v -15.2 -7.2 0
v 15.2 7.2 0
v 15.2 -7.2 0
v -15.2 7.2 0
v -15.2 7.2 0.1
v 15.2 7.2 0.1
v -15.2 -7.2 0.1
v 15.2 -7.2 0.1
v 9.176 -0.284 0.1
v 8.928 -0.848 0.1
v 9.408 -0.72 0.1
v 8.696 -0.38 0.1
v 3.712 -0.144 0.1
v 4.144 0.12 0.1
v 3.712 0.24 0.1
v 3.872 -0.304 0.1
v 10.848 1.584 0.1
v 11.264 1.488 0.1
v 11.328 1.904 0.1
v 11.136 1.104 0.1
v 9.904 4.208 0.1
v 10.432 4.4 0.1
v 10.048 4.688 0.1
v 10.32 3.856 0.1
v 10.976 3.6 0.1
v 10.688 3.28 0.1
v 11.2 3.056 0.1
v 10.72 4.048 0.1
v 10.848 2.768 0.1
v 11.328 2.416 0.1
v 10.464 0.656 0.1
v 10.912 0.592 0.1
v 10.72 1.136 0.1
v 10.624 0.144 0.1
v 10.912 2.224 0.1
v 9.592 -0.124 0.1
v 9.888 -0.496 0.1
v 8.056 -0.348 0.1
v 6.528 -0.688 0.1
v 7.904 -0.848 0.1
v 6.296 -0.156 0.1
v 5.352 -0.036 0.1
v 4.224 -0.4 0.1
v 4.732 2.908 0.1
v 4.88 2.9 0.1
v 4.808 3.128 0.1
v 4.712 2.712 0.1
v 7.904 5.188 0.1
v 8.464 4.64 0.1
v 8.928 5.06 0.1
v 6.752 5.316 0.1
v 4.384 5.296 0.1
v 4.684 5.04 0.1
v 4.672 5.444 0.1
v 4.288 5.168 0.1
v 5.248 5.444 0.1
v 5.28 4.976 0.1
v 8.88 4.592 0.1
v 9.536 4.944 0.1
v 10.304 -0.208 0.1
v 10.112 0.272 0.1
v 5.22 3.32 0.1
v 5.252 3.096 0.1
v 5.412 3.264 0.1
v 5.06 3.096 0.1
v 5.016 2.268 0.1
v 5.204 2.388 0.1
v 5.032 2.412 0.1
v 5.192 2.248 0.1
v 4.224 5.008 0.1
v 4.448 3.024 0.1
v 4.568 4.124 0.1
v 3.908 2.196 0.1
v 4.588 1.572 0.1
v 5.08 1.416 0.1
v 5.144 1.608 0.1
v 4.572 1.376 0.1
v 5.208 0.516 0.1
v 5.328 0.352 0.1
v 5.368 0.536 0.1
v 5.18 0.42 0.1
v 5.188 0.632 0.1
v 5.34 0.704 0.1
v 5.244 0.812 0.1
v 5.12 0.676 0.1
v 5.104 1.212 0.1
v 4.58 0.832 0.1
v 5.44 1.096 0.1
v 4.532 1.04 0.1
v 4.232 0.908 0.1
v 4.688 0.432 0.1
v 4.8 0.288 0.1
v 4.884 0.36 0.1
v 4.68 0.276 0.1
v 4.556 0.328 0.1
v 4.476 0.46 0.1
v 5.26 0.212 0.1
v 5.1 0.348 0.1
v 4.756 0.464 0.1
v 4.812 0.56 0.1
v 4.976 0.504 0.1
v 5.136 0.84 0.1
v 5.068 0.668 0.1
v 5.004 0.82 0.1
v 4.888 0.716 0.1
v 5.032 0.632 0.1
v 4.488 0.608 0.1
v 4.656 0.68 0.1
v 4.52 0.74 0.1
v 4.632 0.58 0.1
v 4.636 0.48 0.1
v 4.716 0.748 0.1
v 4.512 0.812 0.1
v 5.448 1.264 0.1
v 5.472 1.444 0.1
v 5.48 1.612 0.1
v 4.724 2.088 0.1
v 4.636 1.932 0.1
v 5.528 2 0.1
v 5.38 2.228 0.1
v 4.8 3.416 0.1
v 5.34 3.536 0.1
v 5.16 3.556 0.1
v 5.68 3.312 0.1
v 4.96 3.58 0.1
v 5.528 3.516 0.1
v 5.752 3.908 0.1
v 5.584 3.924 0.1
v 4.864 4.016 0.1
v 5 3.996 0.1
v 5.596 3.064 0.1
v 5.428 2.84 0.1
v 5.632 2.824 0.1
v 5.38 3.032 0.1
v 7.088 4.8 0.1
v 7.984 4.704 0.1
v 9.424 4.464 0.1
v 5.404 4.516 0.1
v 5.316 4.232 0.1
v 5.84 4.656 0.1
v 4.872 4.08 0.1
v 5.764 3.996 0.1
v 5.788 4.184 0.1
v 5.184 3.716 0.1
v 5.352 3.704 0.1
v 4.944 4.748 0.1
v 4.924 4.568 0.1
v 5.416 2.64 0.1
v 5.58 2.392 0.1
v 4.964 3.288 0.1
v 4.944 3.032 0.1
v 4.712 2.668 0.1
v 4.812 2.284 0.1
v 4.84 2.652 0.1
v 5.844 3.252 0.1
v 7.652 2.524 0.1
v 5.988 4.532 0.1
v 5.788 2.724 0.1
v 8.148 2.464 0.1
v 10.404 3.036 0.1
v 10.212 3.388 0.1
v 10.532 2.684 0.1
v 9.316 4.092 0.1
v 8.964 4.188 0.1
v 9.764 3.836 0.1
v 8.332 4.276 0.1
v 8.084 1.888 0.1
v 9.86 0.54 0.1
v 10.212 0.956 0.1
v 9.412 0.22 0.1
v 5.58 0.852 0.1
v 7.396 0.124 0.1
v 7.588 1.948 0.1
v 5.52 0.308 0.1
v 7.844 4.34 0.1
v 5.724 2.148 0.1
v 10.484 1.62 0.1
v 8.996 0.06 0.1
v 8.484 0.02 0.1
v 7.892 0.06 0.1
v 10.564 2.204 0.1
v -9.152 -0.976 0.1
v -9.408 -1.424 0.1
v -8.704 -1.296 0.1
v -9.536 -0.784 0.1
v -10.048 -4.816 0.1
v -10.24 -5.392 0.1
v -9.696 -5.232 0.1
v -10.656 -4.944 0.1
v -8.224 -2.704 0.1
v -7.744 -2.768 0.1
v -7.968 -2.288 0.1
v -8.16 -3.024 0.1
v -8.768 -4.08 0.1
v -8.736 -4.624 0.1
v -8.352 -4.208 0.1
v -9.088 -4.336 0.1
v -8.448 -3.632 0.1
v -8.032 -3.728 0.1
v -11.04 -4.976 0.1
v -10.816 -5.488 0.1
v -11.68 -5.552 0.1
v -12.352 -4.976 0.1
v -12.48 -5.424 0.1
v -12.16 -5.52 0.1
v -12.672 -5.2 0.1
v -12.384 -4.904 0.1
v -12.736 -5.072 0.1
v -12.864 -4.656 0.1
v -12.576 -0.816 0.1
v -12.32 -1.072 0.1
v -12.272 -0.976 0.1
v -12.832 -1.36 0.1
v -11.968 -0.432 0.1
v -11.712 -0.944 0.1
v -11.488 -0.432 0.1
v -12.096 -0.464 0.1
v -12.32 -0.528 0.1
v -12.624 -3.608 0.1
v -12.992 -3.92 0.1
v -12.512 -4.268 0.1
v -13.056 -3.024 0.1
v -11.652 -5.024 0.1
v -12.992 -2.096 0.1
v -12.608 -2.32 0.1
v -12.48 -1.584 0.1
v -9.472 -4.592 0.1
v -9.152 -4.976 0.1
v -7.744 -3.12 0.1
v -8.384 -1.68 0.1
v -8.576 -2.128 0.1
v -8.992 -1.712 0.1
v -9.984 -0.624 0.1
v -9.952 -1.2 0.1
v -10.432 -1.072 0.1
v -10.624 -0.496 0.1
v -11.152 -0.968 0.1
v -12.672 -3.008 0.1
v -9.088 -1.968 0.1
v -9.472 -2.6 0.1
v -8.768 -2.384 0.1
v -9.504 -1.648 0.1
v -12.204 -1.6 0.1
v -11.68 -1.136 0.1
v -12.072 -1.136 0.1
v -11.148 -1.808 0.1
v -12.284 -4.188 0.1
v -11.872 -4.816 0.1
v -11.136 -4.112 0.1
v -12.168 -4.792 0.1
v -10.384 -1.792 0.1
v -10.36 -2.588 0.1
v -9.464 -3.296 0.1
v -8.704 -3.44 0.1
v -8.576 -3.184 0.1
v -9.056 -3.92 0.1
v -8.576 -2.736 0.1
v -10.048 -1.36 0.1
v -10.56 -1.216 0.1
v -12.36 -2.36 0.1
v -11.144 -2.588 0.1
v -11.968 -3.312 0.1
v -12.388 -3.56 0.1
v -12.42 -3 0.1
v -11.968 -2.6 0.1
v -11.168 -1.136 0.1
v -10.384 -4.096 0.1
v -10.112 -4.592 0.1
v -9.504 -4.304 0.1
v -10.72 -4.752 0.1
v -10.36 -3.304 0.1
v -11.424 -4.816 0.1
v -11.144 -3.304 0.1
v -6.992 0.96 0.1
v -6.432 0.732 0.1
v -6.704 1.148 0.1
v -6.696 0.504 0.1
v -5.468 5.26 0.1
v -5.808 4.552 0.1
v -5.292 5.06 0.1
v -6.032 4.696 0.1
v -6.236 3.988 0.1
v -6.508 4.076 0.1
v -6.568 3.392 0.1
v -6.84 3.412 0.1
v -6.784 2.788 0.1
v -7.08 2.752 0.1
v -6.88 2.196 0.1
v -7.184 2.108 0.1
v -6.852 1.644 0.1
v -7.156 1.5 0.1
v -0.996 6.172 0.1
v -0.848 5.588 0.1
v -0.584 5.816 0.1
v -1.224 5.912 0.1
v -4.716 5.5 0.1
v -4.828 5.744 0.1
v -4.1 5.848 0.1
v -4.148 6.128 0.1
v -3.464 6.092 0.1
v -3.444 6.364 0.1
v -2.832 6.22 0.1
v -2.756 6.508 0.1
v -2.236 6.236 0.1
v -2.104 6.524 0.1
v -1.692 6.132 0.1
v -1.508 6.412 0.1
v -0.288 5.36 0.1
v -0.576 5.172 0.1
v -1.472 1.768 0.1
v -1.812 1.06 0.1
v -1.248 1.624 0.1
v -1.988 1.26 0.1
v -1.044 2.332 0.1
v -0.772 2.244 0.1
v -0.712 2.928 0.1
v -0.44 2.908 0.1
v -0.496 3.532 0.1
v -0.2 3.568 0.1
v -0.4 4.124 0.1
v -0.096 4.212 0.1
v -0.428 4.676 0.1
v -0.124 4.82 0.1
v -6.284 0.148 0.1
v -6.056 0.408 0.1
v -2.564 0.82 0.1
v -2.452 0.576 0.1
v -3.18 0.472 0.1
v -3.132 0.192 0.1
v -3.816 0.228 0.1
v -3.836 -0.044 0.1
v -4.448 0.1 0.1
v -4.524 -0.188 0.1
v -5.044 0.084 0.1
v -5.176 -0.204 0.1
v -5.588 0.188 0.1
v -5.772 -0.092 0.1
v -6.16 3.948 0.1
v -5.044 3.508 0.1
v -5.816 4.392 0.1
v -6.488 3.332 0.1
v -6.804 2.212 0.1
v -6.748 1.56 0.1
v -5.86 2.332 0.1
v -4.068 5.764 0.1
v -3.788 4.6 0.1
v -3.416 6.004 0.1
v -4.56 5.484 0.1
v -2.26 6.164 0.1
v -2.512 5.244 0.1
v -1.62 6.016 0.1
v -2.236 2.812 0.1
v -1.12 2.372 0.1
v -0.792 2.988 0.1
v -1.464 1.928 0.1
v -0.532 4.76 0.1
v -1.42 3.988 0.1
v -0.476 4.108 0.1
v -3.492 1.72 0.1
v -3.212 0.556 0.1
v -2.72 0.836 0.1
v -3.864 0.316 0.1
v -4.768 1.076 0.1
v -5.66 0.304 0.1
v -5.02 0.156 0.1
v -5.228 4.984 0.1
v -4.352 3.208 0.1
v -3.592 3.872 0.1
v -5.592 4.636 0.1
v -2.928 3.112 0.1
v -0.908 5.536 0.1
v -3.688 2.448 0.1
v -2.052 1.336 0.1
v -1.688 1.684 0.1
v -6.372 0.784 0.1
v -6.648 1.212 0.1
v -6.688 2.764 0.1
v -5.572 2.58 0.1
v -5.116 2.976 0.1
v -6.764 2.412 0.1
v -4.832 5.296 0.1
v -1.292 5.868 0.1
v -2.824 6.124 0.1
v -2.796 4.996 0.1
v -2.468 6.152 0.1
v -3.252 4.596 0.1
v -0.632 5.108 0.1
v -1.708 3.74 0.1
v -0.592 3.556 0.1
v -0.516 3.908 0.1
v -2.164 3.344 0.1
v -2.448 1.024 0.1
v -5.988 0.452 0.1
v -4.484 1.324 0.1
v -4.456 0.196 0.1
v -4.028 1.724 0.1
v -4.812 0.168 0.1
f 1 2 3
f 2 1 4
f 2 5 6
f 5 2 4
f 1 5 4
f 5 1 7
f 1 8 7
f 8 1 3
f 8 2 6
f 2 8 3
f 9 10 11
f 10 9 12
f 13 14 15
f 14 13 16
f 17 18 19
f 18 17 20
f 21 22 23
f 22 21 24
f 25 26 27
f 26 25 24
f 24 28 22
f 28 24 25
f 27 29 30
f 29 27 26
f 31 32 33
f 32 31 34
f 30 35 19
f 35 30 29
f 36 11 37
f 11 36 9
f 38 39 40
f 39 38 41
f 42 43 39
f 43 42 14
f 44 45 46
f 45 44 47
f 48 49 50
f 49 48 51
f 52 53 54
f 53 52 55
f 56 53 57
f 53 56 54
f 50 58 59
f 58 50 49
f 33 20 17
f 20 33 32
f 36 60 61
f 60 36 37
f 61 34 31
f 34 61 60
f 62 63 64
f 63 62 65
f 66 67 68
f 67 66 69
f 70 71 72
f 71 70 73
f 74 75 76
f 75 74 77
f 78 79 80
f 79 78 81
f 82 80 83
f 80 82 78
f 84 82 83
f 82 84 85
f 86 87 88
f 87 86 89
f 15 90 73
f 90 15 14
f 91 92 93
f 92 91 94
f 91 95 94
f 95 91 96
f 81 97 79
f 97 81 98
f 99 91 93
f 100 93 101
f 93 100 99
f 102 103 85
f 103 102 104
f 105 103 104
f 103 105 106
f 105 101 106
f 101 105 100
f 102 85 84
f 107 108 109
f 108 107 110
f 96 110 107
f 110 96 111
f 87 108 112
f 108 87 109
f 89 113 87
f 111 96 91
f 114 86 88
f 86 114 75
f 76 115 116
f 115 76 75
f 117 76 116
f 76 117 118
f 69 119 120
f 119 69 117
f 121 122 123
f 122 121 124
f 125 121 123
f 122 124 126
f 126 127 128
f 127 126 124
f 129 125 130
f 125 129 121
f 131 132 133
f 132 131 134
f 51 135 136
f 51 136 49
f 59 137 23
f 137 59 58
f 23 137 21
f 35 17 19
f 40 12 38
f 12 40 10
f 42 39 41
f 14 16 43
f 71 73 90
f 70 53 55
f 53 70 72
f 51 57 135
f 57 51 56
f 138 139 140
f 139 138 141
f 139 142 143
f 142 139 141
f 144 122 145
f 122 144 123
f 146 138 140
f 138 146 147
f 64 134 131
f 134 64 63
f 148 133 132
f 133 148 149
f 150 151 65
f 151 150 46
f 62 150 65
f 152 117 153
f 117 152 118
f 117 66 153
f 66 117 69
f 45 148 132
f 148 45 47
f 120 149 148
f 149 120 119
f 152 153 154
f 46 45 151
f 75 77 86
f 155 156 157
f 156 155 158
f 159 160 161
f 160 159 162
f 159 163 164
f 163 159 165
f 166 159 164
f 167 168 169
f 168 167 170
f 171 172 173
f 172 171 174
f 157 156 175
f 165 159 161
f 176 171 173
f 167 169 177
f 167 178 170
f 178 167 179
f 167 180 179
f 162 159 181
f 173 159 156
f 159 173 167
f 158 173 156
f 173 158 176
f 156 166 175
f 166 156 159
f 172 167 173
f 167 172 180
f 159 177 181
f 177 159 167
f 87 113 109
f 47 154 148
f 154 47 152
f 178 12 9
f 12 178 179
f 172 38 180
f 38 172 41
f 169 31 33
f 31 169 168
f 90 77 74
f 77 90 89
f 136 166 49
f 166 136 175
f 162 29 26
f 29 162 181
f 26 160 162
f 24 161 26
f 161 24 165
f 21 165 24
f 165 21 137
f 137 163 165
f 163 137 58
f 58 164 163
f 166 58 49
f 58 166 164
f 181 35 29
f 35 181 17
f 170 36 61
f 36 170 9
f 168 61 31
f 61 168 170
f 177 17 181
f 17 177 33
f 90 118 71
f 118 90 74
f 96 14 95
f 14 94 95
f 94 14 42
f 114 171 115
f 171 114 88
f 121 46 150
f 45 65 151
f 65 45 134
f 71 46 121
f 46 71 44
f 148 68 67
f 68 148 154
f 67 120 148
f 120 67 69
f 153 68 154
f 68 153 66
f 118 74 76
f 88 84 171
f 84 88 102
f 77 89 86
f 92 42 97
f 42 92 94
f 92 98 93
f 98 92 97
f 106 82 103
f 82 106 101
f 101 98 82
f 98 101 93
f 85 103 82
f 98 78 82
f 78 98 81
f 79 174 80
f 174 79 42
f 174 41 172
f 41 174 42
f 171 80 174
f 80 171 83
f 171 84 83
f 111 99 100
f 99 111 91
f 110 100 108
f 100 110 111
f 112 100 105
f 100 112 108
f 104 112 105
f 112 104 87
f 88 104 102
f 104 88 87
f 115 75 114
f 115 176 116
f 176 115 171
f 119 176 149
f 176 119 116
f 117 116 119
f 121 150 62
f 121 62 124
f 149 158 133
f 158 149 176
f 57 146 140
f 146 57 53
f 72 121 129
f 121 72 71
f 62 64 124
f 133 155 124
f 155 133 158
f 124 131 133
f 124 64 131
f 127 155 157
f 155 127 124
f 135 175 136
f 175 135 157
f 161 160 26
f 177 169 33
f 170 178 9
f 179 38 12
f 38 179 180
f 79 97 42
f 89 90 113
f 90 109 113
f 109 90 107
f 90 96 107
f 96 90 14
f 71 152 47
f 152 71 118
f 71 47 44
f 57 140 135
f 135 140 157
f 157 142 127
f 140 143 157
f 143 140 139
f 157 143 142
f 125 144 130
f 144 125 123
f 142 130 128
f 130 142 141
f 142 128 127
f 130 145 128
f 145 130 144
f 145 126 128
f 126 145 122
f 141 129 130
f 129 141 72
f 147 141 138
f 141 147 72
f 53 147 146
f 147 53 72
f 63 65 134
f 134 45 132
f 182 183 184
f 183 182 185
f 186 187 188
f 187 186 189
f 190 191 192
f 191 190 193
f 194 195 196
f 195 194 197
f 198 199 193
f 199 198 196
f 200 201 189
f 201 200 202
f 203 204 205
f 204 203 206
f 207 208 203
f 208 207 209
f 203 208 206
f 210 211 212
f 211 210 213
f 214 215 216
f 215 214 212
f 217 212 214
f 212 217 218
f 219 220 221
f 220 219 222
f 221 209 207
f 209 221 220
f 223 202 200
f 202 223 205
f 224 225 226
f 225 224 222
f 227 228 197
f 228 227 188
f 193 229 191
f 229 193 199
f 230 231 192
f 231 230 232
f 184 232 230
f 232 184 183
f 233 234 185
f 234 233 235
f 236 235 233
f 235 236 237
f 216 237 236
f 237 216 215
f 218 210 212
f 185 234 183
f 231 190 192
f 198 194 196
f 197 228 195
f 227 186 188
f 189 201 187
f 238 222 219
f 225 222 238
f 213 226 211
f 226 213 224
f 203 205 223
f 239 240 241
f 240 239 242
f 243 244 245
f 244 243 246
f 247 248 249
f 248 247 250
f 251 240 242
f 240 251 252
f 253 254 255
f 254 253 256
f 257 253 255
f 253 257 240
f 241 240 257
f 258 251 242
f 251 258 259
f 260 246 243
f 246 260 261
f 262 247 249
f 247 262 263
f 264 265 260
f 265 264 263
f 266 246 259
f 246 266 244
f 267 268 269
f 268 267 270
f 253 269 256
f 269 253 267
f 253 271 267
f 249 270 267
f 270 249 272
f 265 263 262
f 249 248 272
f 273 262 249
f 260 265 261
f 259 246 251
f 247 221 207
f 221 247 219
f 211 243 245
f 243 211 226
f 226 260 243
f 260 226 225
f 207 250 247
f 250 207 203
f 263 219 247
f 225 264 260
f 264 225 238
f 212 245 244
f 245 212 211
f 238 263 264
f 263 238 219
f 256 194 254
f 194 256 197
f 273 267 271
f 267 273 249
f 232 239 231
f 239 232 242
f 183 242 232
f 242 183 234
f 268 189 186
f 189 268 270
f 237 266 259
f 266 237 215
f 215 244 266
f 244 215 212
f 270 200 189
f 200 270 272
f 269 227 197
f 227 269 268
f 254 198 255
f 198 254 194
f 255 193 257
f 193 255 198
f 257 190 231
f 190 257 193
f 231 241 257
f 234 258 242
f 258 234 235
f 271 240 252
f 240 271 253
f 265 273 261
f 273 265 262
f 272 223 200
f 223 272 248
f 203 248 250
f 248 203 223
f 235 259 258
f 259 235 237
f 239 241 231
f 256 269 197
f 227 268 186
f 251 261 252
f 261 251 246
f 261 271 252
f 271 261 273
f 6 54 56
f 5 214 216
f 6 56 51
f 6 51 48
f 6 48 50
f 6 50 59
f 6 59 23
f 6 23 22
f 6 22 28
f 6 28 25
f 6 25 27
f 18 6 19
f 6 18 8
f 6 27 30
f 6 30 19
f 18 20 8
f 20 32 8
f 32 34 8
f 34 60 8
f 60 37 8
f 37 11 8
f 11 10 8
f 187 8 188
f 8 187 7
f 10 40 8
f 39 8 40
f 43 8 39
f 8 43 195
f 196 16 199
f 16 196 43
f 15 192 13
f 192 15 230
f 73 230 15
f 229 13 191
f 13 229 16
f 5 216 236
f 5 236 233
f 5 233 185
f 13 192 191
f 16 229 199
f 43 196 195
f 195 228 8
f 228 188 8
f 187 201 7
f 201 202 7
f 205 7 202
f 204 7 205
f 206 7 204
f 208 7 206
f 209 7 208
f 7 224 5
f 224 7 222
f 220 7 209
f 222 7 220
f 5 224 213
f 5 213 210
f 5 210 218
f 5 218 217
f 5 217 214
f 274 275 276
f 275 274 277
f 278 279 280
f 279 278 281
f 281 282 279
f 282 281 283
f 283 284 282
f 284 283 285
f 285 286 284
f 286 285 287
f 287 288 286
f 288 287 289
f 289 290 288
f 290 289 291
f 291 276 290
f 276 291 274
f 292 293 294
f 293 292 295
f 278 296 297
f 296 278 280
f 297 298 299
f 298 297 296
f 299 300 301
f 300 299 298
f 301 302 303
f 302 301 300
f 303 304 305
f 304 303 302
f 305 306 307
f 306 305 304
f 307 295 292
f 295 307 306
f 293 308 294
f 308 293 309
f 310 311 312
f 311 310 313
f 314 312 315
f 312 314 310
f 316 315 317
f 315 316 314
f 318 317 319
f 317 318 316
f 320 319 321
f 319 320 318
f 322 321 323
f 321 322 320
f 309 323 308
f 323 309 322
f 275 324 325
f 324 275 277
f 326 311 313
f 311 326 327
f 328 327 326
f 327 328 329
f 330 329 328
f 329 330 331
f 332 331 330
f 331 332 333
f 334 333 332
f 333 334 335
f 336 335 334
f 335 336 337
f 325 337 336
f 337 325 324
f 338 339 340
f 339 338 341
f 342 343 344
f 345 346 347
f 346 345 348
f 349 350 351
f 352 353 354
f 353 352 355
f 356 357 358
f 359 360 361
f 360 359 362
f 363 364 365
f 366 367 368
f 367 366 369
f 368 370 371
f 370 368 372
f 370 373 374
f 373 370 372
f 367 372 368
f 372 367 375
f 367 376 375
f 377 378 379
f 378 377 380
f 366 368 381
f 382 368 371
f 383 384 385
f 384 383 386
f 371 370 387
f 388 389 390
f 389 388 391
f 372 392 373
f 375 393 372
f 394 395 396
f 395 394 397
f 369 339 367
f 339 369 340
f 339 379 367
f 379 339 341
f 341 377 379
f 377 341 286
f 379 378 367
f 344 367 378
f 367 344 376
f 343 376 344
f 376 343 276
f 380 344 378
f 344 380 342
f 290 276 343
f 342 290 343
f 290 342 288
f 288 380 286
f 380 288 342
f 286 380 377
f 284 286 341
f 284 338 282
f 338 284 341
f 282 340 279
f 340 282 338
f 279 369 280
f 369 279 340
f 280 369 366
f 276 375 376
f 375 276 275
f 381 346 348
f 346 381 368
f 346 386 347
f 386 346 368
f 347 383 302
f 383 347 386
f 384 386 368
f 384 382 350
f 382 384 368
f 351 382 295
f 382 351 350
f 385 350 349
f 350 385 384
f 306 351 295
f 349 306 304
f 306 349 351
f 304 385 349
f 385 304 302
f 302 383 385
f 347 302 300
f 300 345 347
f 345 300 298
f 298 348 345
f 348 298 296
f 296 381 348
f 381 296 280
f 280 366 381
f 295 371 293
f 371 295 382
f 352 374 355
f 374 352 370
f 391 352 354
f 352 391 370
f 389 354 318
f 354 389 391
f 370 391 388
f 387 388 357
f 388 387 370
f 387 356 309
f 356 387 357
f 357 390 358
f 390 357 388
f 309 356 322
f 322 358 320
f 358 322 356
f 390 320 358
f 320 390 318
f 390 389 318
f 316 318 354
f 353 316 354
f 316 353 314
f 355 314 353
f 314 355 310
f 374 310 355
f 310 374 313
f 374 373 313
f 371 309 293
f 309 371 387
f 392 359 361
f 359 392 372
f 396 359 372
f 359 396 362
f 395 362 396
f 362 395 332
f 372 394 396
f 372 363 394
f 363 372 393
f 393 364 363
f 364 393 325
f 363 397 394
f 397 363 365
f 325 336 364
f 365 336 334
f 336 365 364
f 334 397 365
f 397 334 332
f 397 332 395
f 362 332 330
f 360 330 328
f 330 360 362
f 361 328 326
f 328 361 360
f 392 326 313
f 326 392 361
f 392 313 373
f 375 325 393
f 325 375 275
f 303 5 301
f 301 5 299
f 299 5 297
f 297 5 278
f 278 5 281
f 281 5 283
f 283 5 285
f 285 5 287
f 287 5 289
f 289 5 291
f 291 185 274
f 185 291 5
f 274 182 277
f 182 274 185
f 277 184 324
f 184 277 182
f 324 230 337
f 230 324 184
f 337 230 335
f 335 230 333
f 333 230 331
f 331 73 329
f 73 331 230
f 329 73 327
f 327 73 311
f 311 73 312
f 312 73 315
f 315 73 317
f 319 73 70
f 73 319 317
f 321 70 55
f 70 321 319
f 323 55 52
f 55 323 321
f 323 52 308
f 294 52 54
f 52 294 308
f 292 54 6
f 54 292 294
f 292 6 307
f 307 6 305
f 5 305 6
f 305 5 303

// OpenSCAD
// file: ../p/box5-12.scad
use <../lib.scad>
function ldraw_lib__box5_12() = [
// 0 Box with 5 Faces without Any Edges
// 0 Name: box5-12.dat
// 0 Author: Chris Dee [cwdee]
// 0 !LDRAW_ORG Primitive UPDATE 2009-02
// 0 !LICENSE Licensed under CC BY 4.0 : see CAreadme.txt
// 
// 0 BFC CERTIFY CCW
  [0,"BFC","CERTIFY"],
  [0,"BFC","CCW"],
// 
// 0 !HISTORY 2009-09-03 [PTadmin] Official Update 2009-02
// 
// 
// 4 16 1 1 1 1 1 -1 -1 1 -1 -1 1 1
  [4,16,1,1,1,1,1,-1,-1,1,-1,-1,1,1],
// 4 16 -1 0 1 1 0 1 1 1 1 -1 1 1
  [4,16,-1,0,1,1,0,1,1,1,1,-1,1,1],
// 4 16 -1 0 -1 -1 0 1 -1 1 1 -1 1 -1
  [4,16,-1,0,-1,-1,0,1,-1,1,1,-1,1,-1],
// 4 16 1 0 -1 -1 0 -1 -1 1 -1 1 1 -1
  [4,16,1,0,-1,-1,0,-1,-1,1,-1,1,1,-1],
// 4 16 1 0 1 1 0 -1 1 1 -1 1 1 1
  [4,16,1,0,1,1,0,-1,1,1,-1,1,1,1],
// 0
];
module ldraw_lib__box5_12(step=0, col=false, unit=2/5, alt=false, line=0.2, solid=!$preview)
    makepoly(ldraw_lib__box5_12(), step=step, col=col, unit=unit, alt=alt, line=line, solid=solid);
ldraw_lib__box5_12(line=0.2);
// main file
use <../lib.scad>
use <../p/box5-12.scad>
use <s/6296256as01.scad>
function ldraw_lib__6372023a() = [
// 0 Sticker  1.8 x  3.8 with Switzerland, Sweden and UK Stickers on Medium Nougat
// 0 Name: 6372023a.dat
// 0 Author: Magnus Forsberg [MagFors]
// 0 !LDRAW_ORG Part UPDATE 2024-05
// 0 !LICENSE Licensed under CC BY 4.0 : see CAreadme.txt
// 
// 0 BFC CERTIFY CCW
  [0,"BFC","CERTIFY"],
  [0,"BFC","CCW"],
// 
// 0 !KEYWORDS 500, Bricklink 77942stk01, Brickowl 1064764, Cinquecento, FIAT
// 0 !KEYWORDS Nuova, Rebrickable 83460, set 77942, Union Jack, United Kingdom
// 
// 0 !HISTORY 2024-06-30 [OrionP] Official Update 2024-05
// 
// 
// 1 16 0 -.25 0 38 0 0 0 .25 0 0 0 18 box5-12.dat
  [1,16,0,-.25,0,38,0,0,0,.25,0,0,0,18, ldraw_lib__box5_12()],
// 1 84 0 -.25 0 1 0 0 0 1 0 0 0 1 s\6296256as01.dat
  [1,84,0,-.25,0,1,0,0,0,1,0,0,0,1, ldraw_lib__s__6296256as01()],
// 
// 0 // United Kingdom
// 4 0 -16.08 -.25 1.83 -16.76 -.25 2.87 -17.48 -.25 2.4 -16.74 -.25 1.26
  [4,0,-16.08,-.25,1.83,-16.76,-.25,2.87,-17.48,-.25,2.4,-16.74,-.25,1.26],
// 4 0 -14.52 -.25 11.38 -13.23 -.25 12.65 -13.67 -.25 13.15 -15.08 -.25 11.74
  [4,0,-14.52,-.25,11.38,-13.23,-.25,12.65,-13.67,-.25,13.15,-15.08,-.25,11.74],
// 4 0 -15.59 -.25 9.97 -14.52 -.25 11.38 -15.08 -.25 11.74 -16.27 -.25 10.19
  [4,0,-15.59,-.25,9.97,-14.52,-.25,11.38,-15.08,-.25,11.74,-16.27,-.25,10.19],
// 4 0 -16.42 -.25 8.48 -15.59 -.25 9.97 -16.27 -.25 10.19 -17.1 -.25 8.53
  [4,0,-16.42,-.25,8.48,-15.59,-.25,9.97,-16.27,-.25,10.19,-17.1,-.25,8.53],
// 4 0 -16.96 -.25 6.97 -16.42 -.25 8.48 -17.1 -.25 8.53 -17.7 -.25 6.88
  [4,0,-16.96,-.25,6.97,-16.42,-.25,8.48,-17.1,-.25,8.53,-17.7,-.25,6.88],
// 4 0 -17.2 -.25 5.49 -16.96 -.25 6.97 -17.7 -.25 6.88 -17.96 -.25 5.27
  [4,0,-17.2,-.25,5.49,-16.96,-.25,6.97,-17.7,-.25,6.88,-17.96,-.25,5.27],
// 4 0 -17.13 -.25 4.11 -17.2 -.25 5.49 -17.96 -.25 5.27 -17.89 -.25 3.75
  [4,0,-17.13,-.25,4.11,-17.2,-.25,5.49,-17.96,-.25,5.27,-17.89,-.25,3.75],
// 4 0 -16.76 -.25 2.87 -17.13 -.25 4.11 -17.89 -.25 3.75 -17.48 -.25 2.4
  [4,0,-16.76,-.25,2.87,-17.13,-.25,4.11,-17.89,-.25,3.75,-17.48,-.25,2.4],
// 4 0 -2.49 -.25 15.43 -3.06 -.25 14.78 -2.12 -.25 13.97 -1.46 -.25 14.54
  [4,0,-2.49,-.25,15.43,-3.06,-.25,14.78,-2.12,-.25,13.97,-1.46,-.25,14.54],
// 4 0 -13.67 -.25 13.15 -13.23 -.25 12.65 -11.79 -.25 13.75 -12.07 -.25 14.36
  [4,0,-13.67,-.25,13.15,-13.23,-.25,12.65,-11.79,-.25,13.75,-12.07,-.25,14.36],
// 4 0 -12.07 -.25 14.36 -11.79 -.25 13.75 -10.25 -.25 14.62 -10.37 -.25 15.32
  [4,0,-12.07,-.25,14.36,-11.79,-.25,13.75,-10.25,-.25,14.62,-10.37,-.25,15.32],
// 4 0 -10.37 -.25 15.32 -10.25 -.25 14.62 -8.66 -.25 15.23 -8.61 -.25 15.91
  [4,0,-10.37,-.25,15.32,-10.25,-.25,14.62,-8.66,-.25,15.23,-8.61,-.25,15.91],
// 4 0 -8.61 -.25 15.91 -8.66 -.25 15.23 -7.08 -.25 15.55 -6.89 -.25 16.27
  [4,0,-8.61,-.25,15.91,-8.66,-.25,15.23,-7.08,-.25,15.55,-6.89,-.25,16.27],
// 4 0 -6.89 -.25 16.27 -7.08 -.25 15.55 -5.59 -.25 15.59 -5.26 -.25 16.31
  [4,0,-6.89,-.25,16.27,-7.08,-.25,15.55,-5.59,-.25,15.59,-5.26,-.25,16.31],
// 4 0 -5.26 -.25 16.31 -5.59 -.25 15.59 -4.23 -.25 15.33 -3.77 -.25 16.03
  [4,0,-5.26,-.25,16.31,-5.59,-.25,15.59,-4.23,-.25,15.33,-3.77,-.25,16.03],
// 4 0 -3.77 -.25 16.03 -4.23 -.25 15.33 -3.06 -.25 14.78 -2.49 -.25 15.43
  [4,0,-3.77,-.25,16.03,-4.23,-.25,15.33,-3.06,-.25,14.78,-2.49,-.25,15.43],
// 4 0 -2.12 -.25 13.97 -1.44 -.25 12.93 -.72 -.25 13.4 -1.46 -.25 14.54
  [4,0,-2.12,-.25,13.97,-1.44,-.25,12.93,-.72,-.25,13.4,-1.46,-.25,14.54],
// 4 0 -3.68 -.25 4.42 -4.97 -.25 3.15 -4.53 -.25 2.65 -3.12 -.25 4.06
  [4,0,-3.68,-.25,4.42,-4.97,-.25,3.15,-4.53,-.25,2.65,-3.12,-.25,4.06],
// 4 0 -2.61 -.25 5.83 -3.68 -.25 4.42 -3.12 -.25 4.06 -1.93 -.25 5.61
  [4,0,-2.61,-.25,5.83,-3.68,-.25,4.42,-3.12,-.25,4.06,-1.93,-.25,5.61],
// 4 0 -1.78 -.25 7.32 -2.61 -.25 5.83 -1.93 -.25 5.61 -1.1 -.25 7.27
  [4,0,-1.78,-.25,7.32,-2.61,-.25,5.83,-1.93,-.25,5.61,-1.1,-.25,7.27],
// 4 0 -1.24 -.25 8.83 -1.78 -.25 7.32 -1.1 -.25 7.27 -.5 -.25 8.92
  [4,0,-1.24,-.25,8.83,-1.78,-.25,7.32,-1.1,-.25,7.27,-.5,-.25,8.92],
// 4 0 -1 -.25 10.31 -1.24 -.25 8.83 -.5 -.25 8.92 -.24 -.25 10.53
  [4,0,-1,-.25,10.31,-1.24,-.25,8.83,-.5,-.25,8.92,-.24,-.25,10.53],
// 4 0 -1.07 -.25 11.69 -1 -.25 10.31 -.24 -.25 10.53 -.31 -.25 12.05
  [4,0,-1.07,-.25,11.69,-1,-.25,10.31,-.24,-.25,10.53,-.31,-.25,12.05],
// 4 0 -1.44 -.25 12.93 -1.07 -.25 11.69 -.31 -.25 12.05 -.72 -.25 13.4
  [4,0,-1.44,-.25,12.93,-1.07,-.25,11.69,-.31,-.25,12.05,-.72,-.25,13.4],
// 4 0 -15.71 -.25 .37 -15.14 -.25 1.02 -16.08 -.25 1.83 -16.74 -.25 1.26
  [4,0,-15.71,-.25,.37,-15.14,-.25,1.02,-16.08,-.25,1.83,-16.74,-.25,1.26],
// 4 0 -4.53 -.25 2.65 -4.97 -.25 3.15 -6.41 -.25 2.05 -6.13 -.25 1.44
  [4,0,-4.53,-.25,2.65,-4.97,-.25,3.15,-6.41,-.25,2.05,-6.13,-.25,1.44],
// 4 0 -6.13 -.25 1.44 -6.41 -.25 2.05 -7.95 -.25 1.18 -7.83 -.25 .48
  [4,0,-6.13,-.25,1.44,-6.41,-.25,2.05,-7.95,-.25,1.18,-7.83,-.25,.48],
// 4 0 -7.83 -.25 .48 -7.95 -.25 1.18 -9.54 -.25 .57 -9.59 -.25 -.11
  [4,0,-7.83,-.25,.48,-7.95,-.25,1.18,-9.54,-.25,.57,-9.59,-.25,-.11],
// 4 0 -9.59 -.25 -.11 -9.54 -.25 .57 -11.12 -.25 .25 -11.31 -.25 -.47
  [4,0,-9.59,-.25,-.11,-9.54,-.25,.57,-11.12,-.25,.25,-11.31,-.25,-.47],
// 4 0 -11.31 -.25 -.47 -11.12 -.25 .25 -12.61 -.25 .21 -12.94 -.25 -.51
  [4,0,-11.31,-.25,-.47,-11.12,-.25,.25,-12.61,-.25,.21,-12.94,-.25,-.51],
// 4 0 -12.94 -.25 -.51 -12.61 -.25 .21 -13.97 -.25 .47 -14.43 -.25 -.23
  [4,0,-12.94,-.25,-.51,-12.61,-.25,.21,-13.97,-.25,.47,-14.43,-.25,-.23],
// 4 0 -14.43 -.25 -.23 -13.97 -.25 .47 -15.14 -.25 1.02 -15.71 -.25 .37
  [4,0,-14.43,-.25,-.23,-13.97,-.25,.47,-15.14,-.25,1.02,-15.71,-.25,.37],
// 4 1 -12.61 -.25 8.77 -14.54 -.25 10.98 -15.4 -.25 9.87 -16.22 -.25 8.33
  [4,1,-12.61,-.25,8.77,-14.54,-.25,10.98,-15.4,-.25,9.87,-16.22,-.25,8.33],
// 3 1 -17.01 -.25 5.53 -16.87 -.25 3.9 -14.65 -.25 5.83
  [3,1,-17.01,-.25,5.53,-16.87,-.25,3.9,-14.65,-.25,5.83],
// 4 1 -10.17 -.25 14.41 -11.4 -.25 13.71 -9.47 -.25 11.5 -8.54 -.25 15.01
  [4,1,-10.17,-.25,14.41,-11.4,-.25,13.71,-9.47,-.25,11.5,-8.54,-.25,15.01],
// 3 1 -5.65 -.25 15.41 -6.28 -.25 13.11 -4.05 -.25 15.04
  [3,1,-5.65,-.25,15.41,-6.28,-.25,13.11,-4.05,-.25,15.04],
// 4 1 -5.59 -.25 7.03 -3.66 -.25 4.82 -2.8 -.25 5.93 -1.98 -.25 7.47
  [4,1,-5.59,-.25,7.03,-3.66,-.25,4.82,-2.8,-.25,5.93,-1.98,-.25,7.47],
// 3 1 -1.33 -.25 11.9 -3.55 -.25 9.97 -1.19 -.25 10.27
  [3,1,-1.33,-.25,11.9,-3.55,-.25,9.97,-1.19,-.25,10.27],
// 4 1 -8.03 -.25 1.39 -6.8 -.25 2.09 -8.73 -.25 4.3 -9.66 -.25 .79
  [4,1,-8.03,-.25,1.39,-6.8,-.25,2.09,-8.73,-.25,4.3,-9.66,-.25,.79],
// 3 1 -11.92 -.25 2.69 -14.15 -.25 .76 -12.55 -.25 .39
  [3,1,-11.92,-.25,2.69,-14.15,-.25,.76,-12.55,-.25,.39],
// 4 4 -13.07 -.25 12.46 -13.98 -.25 11.59 -10.88 -.25 8.02 -8.98 -.25 9.68
  [4,4,-13.07,-.25,12.46,-13.98,-.25,11.59,-10.88,-.25,8.02,-8.98,-.25,9.68],
// 4 4 -7.32 -.25 7.78 -2.27 -.25 13.84 -8.98 -.25 9.68 -9.22 -.25 6.12
  [4,4,-7.32,-.25,7.78,-2.27,-.25,13.84,-8.98,-.25,9.68,-9.22,-.25,6.12],
// 4 4 -7.32 -.25 7.78 -9.22 -.25 6.12 -5.13 -.25 3.34 -4.22 -.25 4.21
  [4,4,-7.32,-.25,7.78,-9.22,-.25,6.12,-5.13,-.25,3.34,-4.22,-.25,4.21],
// 4 4 -9.22 -.25 6.12 -8.98 -.25 9.68 -10.88 -.25 8.02 -15.93 -.25 1.96
  [4,4,-9.22,-.25,6.12,-8.98,-.25,9.68,-10.88,-.25,8.02,-15.93,-.25,1.96],
// 3 4 -10.88 -.25 8.02 -16.62 -.25 3.03 -15.93 -.25 1.96
  [3,4,-10.88,-.25,8.02,-16.62,-.25,3.03,-15.93,-.25,1.96],
// 4 4 -13.93 -.25 6.45 -12.79 -.25 7.44 -16.72 -.25 6.91 -16.91 -.25 6.03
  [4,4,-13.93,-.25,6.45,-12.79,-.25,7.44,-16.72,-.25,6.91,-16.91,-.25,6.03],
// 3 4 -13.07 -.25 12.46 -8.98 -.25 9.68 -12.08 -.25 13.24
  [3,4,-13.07,-.25,12.46,-8.98,-.25,9.68,-12.08,-.25,13.24],
// 3 4 -3.23 -.25 14.67 -8.98 -.25 9.68 -2.27 -.25 13.84
  [3,4,-3.23,-.25,14.67,-8.98,-.25,9.68,-2.27,-.25,13.84],
// 4 4 -7.06 -.25 15.31 -8.13 -.25 11.49 -6.99 -.25 12.49 -6.17 -.25 15.38
  [4,4,-7.06,-.25,15.31,-8.13,-.25,11.49,-6.99,-.25,12.49,-6.17,-.25,15.38],
// 3 4 -2.27 -.25 13.84 -7.32 -.25 7.78 -1.58 -.25 12.77
  [3,4,-2.27,-.25,13.84,-7.32,-.25,7.78,-1.58,-.25,12.77],
// 4 4 -4.27 -.25 9.35 -5.41 -.25 8.36 -1.48 -.25 8.89 -1.29 -.25 9.77
  [4,4,-4.27,-.25,9.35,-5.41,-.25,8.36,-1.48,-.25,8.89,-1.29,-.25,9.77],
// 3 4 -9.22 -.25 6.12 -6.12 -.25 2.56 -5.13 -.25 3.34
  [3,4,-9.22,-.25,6.12,-6.12,-.25,2.56,-5.13,-.25,3.34],
// 3 4 -15.93 -.25 1.96 -14.97 -.25 1.13 -9.22 -.25 6.12
  [3,4,-15.93,-.25,1.96,-14.97,-.25,1.13,-9.22,-.25,6.12],
// 4 4 -11.14 -.25 .49 -10.07 -.25 4.31 -11.21 -.25 3.31 -12.03 -.25 .42
  [4,4,-11.14,-.25,.49,-10.07,-.25,4.31,-11.21,-.25,3.31,-12.03,-.25,.42],
// 4 15 -13.98 -.25 11.59 -14.54 -.25 10.98 -12.61 -.25 8.77 -10.88 -.25 8.02
  [4,15,-13.98,-.25,11.59,-14.54,-.25,10.98,-12.61,-.25,8.77,-10.88,-.25,8.02],
// 4 15 -12.79 -.25 7.44 -10.88 -.25 8.02 -12.61 -.25 8.77 -16.22 -.25 8.33
  [4,15,-12.79,-.25,7.44,-10.88,-.25,8.02,-12.61,-.25,8.77,-16.22,-.25,8.33],
// 4 15 -16.72 -.25 6.91 -12.79 -.25 7.44 -16.22 -.25 8.33 -16.96 -.25 6.97
  [4,15,-16.72,-.25,6.91,-12.79,-.25,7.44,-16.22,-.25,8.33,-16.96,-.25,6.97],
// 3 15 -12.79 -.25 7.44 -13.93 -.25 6.45 -10.88 -.25 8.02
  [3,15,-12.79,-.25,7.44,-13.93,-.25,6.45,-10.88,-.25,8.02],
// 4 15 -10.88 -.25 8.02 -13.93 -.25 6.45 -14.65 -.25 5.83 -16.62 -.25 3.03
  [4,15,-10.88,-.25,8.02,-13.93,-.25,6.45,-14.65,-.25,5.83,-16.62,-.25,3.03],
// 4 15 -16.62 -.25 3.03 -14.65 -.25 5.83 -16.87 -.25 3.9 -16.76 -.25 2.87
  [4,15,-16.62,-.25,3.03,-14.65,-.25,5.83,-16.87,-.25,3.9,-16.76,-.25,2.87],
// 4 15 -14.65 -.25 5.83 -13.93 -.25 6.45 -16.91 -.25 6.03 -17.01 -.25 5.53
  [4,15,-14.65,-.25,5.83,-13.93,-.25,6.45,-16.91,-.25,6.03,-17.01,-.25,5.53],
// 3 15 -17.13 -.25 4.11 -16.76 -.25 2.87 -16.87 -.25 3.9
  [3,15,-17.13,-.25,4.11,-16.76,-.25,2.87,-16.87,-.25,3.9],
// 4 15 -17.13 -.25 4.11 -16.87 -.25 3.9 -17.01 -.25 5.53 -17.2 -.25 5.49
  [4,15,-17.13,-.25,4.11,-16.87,-.25,3.9,-17.01,-.25,5.53,-17.2,-.25,5.49],
// 4 15 -17.2 -.25 5.49 -17.01 -.25 5.53 -16.91 -.25 6.03 -16.96 -.25 6.97
  [4,15,-17.2,-.25,5.49,-17.01,-.25,5.53,-16.91,-.25,6.03,-16.96,-.25,6.97],
// 3 15 -16.96 -.25 6.97 -16.91 -.25 6.03 -16.72 -.25 6.91
  [3,15,-16.96,-.25,6.97,-16.91,-.25,6.03,-16.72,-.25,6.91],
// 3 15 -16.42 -.25 8.48 -16.96 -.25 6.97 -16.22 -.25 8.33
  [3,15,-16.42,-.25,8.48,-16.96,-.25,6.97,-16.22,-.25,8.33],
// 4 15 -16.22 -.25 8.33 -15.4 -.25 9.87 -15.59 -.25 9.97 -16.42 -.25 8.48
  [4,15,-16.22,-.25,8.33,-15.4,-.25,9.87,-15.59,-.25,9.97,-16.42,-.25,8.48],
// 4 15 -15.59 -.25 9.97 -15.4 -.25 9.87 -14.54 -.25 10.98 -14.52 -.25 11.38
  [4,15,-15.59,-.25,9.97,-15.4,-.25,9.87,-14.54,-.25,10.98,-14.52,-.25,11.38],
// 4 15 -14.52 -.25 11.38 -14.54 -.25 10.98 -13.98 -.25 11.59 -13.23 -.25 12.65
  [4,15,-14.52,-.25,11.38,-14.54,-.25,10.98,-13.98,-.25,11.59,-13.23,-.25,12.65],
// 3 15 -13.23 -.25 12.65 -13.98 -.25 11.59 -13.07 -.25 12.46
  [3,15,-13.23,-.25,12.65,-13.98,-.25,11.59,-13.07,-.25,12.46],
// 4 15 -15.93 -.25 1.96 -16.62 -.25 3.03 -16.76 -.25 2.87 -16.08 -.25 1.83
  [4,15,-15.93,-.25,1.96,-16.62,-.25,3.03,-16.76,-.25,2.87,-16.08,-.25,1.83],
// 4 15 -9.47 -.25 11.5 -11.4 -.25 13.71 -12.08 -.25 13.24 -8.98 -.25 9.68
  [4,15,-9.47,-.25,11.5,-11.4,-.25,13.71,-12.08,-.25,13.24,-8.98,-.25,9.68],
// 4 15 -9.47 -.25 11.5 -8.98 -.25 9.68 -8.13 -.25 11.49 -8.54 -.25 15.01
  [4,15,-9.47,-.25,11.5,-8.98,-.25,9.68,-8.13,-.25,11.49,-8.54,-.25,15.01],
// 4 15 -8.54 -.25 15.01 -8.13 -.25 11.49 -7.06 -.25 15.31 -7.08 -.25 15.55
  [4,15,-8.54,-.25,15.01,-8.13,-.25,11.49,-7.06,-.25,15.31,-7.08,-.25,15.55],
// 3 15 -6.99 -.25 12.49 -8.13 -.25 11.49 -8.98 -.25 9.68
  [3,15,-6.99,-.25,12.49,-8.13,-.25,11.49,-8.98,-.25,9.68],
// 4 15 -6.28 -.25 13.11 -6.99 -.25 12.49 -8.98 -.25 9.68 -3.23 -.25 14.67
  [4,15,-6.28,-.25,13.11,-6.99,-.25,12.49,-8.98,-.25,9.68,-3.23,-.25,14.67],
// 4 15 -4.05 -.25 15.04 -6.28 -.25 13.11 -3.23 -.25 14.67 -3.06 -.25 14.78
  [4,15,-4.05,-.25,15.04,-6.28,-.25,13.11,-3.23,-.25,14.67,-3.06,-.25,14.78],
// 4 15 -6.17 -.25 15.38 -6.99 -.25 12.49 -6.28 -.25 13.11 -5.65 -.25 15.41
  [4,15,-6.17,-.25,15.38,-6.99,-.25,12.49,-6.28,-.25,13.11,-5.65,-.25,15.41],
// 3 15 -4.23 -.25 15.33 -4.05 -.25 15.04 -3.06 -.25 14.78
  [3,15,-4.23,-.25,15.33,-4.05,-.25,15.04,-3.06,-.25,14.78],
// 4 15 -5.65 -.25 15.41 -4.05 -.25 15.04 -4.23 -.25 15.33 -5.59 -.25 15.59
  [4,15,-5.65,-.25,15.41,-4.05,-.25,15.04,-4.23,-.25,15.33,-5.59,-.25,15.59],
// 4 15 -6.17 -.25 15.38 -5.65 -.25 15.41 -5.59 -.25 15.59 -7.08 -.25 15.55
  [4,15,-6.17,-.25,15.38,-5.65,-.25,15.41,-5.59,-.25,15.59,-7.08,-.25,15.55],
// 3 15 -7.08 -.25 15.55 -7.06 -.25 15.31 -6.17 -.25 15.38
  [3,15,-7.08,-.25,15.55,-7.06,-.25,15.31,-6.17,-.25,15.38],
// 3 15 -8.54 -.25 15.01 -7.08 -.25 15.55 -8.66 -.25 15.23
  [3,15,-8.54,-.25,15.01,-7.08,-.25,15.55,-8.66,-.25,15.23],
// 4 15 -10.25 -.25 14.62 -10.17 -.25 14.41 -8.54 -.25 15.01 -8.66 -.25 15.23
  [4,15,-10.25,-.25,14.62,-10.17,-.25,14.41,-8.54,-.25,15.01,-8.66,-.25,15.23],
// 4 15 -11.4 -.25 13.71 -10.17 -.25 14.41 -10.25 -.25 14.62 -11.79 -.25 13.75
  [4,15,-11.4,-.25,13.71,-10.17,-.25,14.41,-10.25,-.25,14.62,-11.79,-.25,13.75],
// 4 15 -12.08 -.25 13.24 -11.4 -.25 13.71 -11.79 -.25 13.75 -13.23 -.25 12.65
  [4,15,-12.08,-.25,13.24,-11.4,-.25,13.71,-11.79,-.25,13.75,-13.23,-.25,12.65],
// 3 15 -13.23 -.25 12.65 -13.07 -.25 12.46 -12.08 -.25 13.24
  [3,15,-13.23,-.25,12.65,-13.07,-.25,12.46,-12.08,-.25,13.24],
// 4 15 -3.06 -.25 14.78 -3.23 -.25 14.67 -2.27 -.25 13.84 -2.12 -.25 13.97
  [4,15,-3.06,-.25,14.78,-3.23,-.25,14.67,-2.27,-.25,13.84,-2.12,-.25,13.97],
// 4 15 -4.22 -.25 4.21 -3.66 -.25 4.82 -5.59 -.25 7.03 -7.32 -.25 7.78
  [4,15,-4.22,-.25,4.21,-3.66,-.25,4.82,-5.59,-.25,7.03,-7.32,-.25,7.78],
// 4 15 -5.41 -.25 8.36 -7.32 -.25 7.78 -5.59 -.25 7.03 -1.98 -.25 7.47
  [4,15,-5.41,-.25,8.36,-7.32,-.25,7.78,-5.59,-.25,7.03,-1.98,-.25,7.47],
// 4 15 -1.48 -.25 8.89 -5.41 -.25 8.36 -1.98 -.25 7.47 -1.24 -.25 8.83
  [4,15,-1.48,-.25,8.89,-5.41,-.25,8.36,-1.98,-.25,7.47,-1.24,-.25,8.83],
// 3 15 -7.32 -.25 7.78 -5.41 -.25 8.36 -4.27 -.25 9.35
  [3,15,-7.32,-.25,7.78,-5.41,-.25,8.36,-4.27,-.25,9.35],
// 4 15 -7.32 -.25 7.78 -4.27 -.25 9.35 -3.55 -.25 9.97 -1.58 -.25 12.77
  [4,15,-7.32,-.25,7.78,-4.27,-.25,9.35,-3.55,-.25,9.97,-1.58,-.25,12.77],
// 4 15 -1.58 -.25 12.77 -3.55 -.25 9.97 -1.33 -.25 11.9 -1.44 -.25 12.93
  [4,15,-1.58,-.25,12.77,-3.55,-.25,9.97,-1.33,-.25,11.9,-1.44,-.25,12.93],
// 4 15 -3.55 -.25 9.97 -4.27 -.25 9.35 -1.29 -.25 9.77 -1.19 -.25 10.27
  [4,15,-3.55,-.25,9.97,-4.27,-.25,9.35,-1.29,-.25,9.77,-1.19,-.25,10.27],
// 3 15 -1.44 -.25 12.93 -1.33 -.25 11.9 -1.07 -.25 11.69
  [3,15,-1.44,-.25,12.93,-1.33,-.25,11.9,-1.07,-.25,11.69],
// 4 15 -1.07 -.25 11.69 -1.33 -.25 11.9 -1.19 -.25 10.27 -1 -.25 10.31
  [4,15,-1.07,-.25,11.69,-1.33,-.25,11.9,-1.19,-.25,10.27,-1,-.25,10.31],
// 4 15 -1 -.25 10.31 -1.19 -.25 10.27 -1.29 -.25 9.77 -1.24 -.25 8.83
  [4,15,-1,-.25,10.31,-1.19,-.25,10.27,-1.29,-.25,9.77,-1.24,-.25,8.83],
// 3 15 -1.29 -.25 9.77 -1.48 -.25 8.89 -1.24 -.25 8.83
  [3,15,-1.29,-.25,9.77,-1.48,-.25,8.89,-1.24,-.25,8.83],
// 3 15 -1.78 -.25 7.32 -1.24 -.25 8.83 -1.98 -.25 7.47
  [3,15,-1.78,-.25,7.32,-1.24,-.25,8.83,-1.98,-.25,7.47],
// 4 15 -1.98 -.25 7.47 -2.8 -.25 5.93 -2.61 -.25 5.83 -1.78 -.25 7.32
  [4,15,-1.98,-.25,7.47,-2.8,-.25,5.93,-2.61,-.25,5.83,-1.78,-.25,7.32],
// 4 15 -2.61 -.25 5.83 -2.8 -.25 5.93 -3.66 -.25 4.82 -3.68 -.25 4.42
  [4,15,-2.61,-.25,5.83,-2.8,-.25,5.93,-3.66,-.25,4.82,-3.68,-.25,4.42],
// 4 15 -3.68 -.25 4.42 -3.66 -.25 4.82 -4.22 -.25 4.21 -4.97 -.25 3.15
  [4,15,-3.68,-.25,4.42,-3.66,-.25,4.82,-4.22,-.25,4.21,-4.97,-.25,3.15],
// 3 15 -4.22 -.25 4.21 -5.13 -.25 3.34 -4.97 -.25 3.15
  [3,15,-4.22,-.25,4.21,-5.13,-.25,3.34,-4.97,-.25,3.15],
// 4 15 -2.27 -.25 13.84 -1.58 -.25 12.77 -1.44 -.25 12.93 -2.12 -.25 13.97
  [4,15,-2.27,-.25,13.84,-1.58,-.25,12.77,-1.44,-.25,12.93,-2.12,-.25,13.97],
// 4 15 -8.73 -.25 4.3 -6.8 -.25 2.09 -6.12 -.25 2.56 -9.22 -.25 6.12
  [4,15,-8.73,-.25,4.3,-6.8,-.25,2.09,-6.12,-.25,2.56,-9.22,-.25,6.12],
// 4 15 -8.73 -.25 4.3 -9.22 -.25 6.12 -10.07 -.25 4.31 -9.66 -.25 .79
  [4,15,-8.73,-.25,4.3,-9.22,-.25,6.12,-10.07,-.25,4.31,-9.66,-.25,.79],
// 4 15 -9.66 -.25 .79 -10.07 -.25 4.31 -11.14 -.25 .49 -11.12 -.25 .25
  [4,15,-9.66,-.25,.79,-10.07,-.25,4.31,-11.14,-.25,.49,-11.12,-.25,.25],
// 3 15 -9.22 -.25 6.12 -11.21 -.25 3.31 -10.07 -.25 4.31
  [3,15,-9.22,-.25,6.12,-11.21,-.25,3.31,-10.07,-.25,4.31],
// 4 15 -11.92 -.25 2.69 -11.21 -.25 3.31 -9.22 -.25 6.12 -14.97 -.25 1.13
  [4,15,-11.92,-.25,2.69,-11.21,-.25,3.31,-9.22,-.25,6.12,-14.97,-.25,1.13],
// 4 15 -14.15 -.25 .76 -11.92 -.25 2.69 -14.97 -.25 1.13 -15.14 -.25 1.02
  [4,15,-14.15,-.25,.76,-11.92,-.25,2.69,-14.97,-.25,1.13,-15.14,-.25,1.02],
// 4 15 -12.03 -.25 .42 -11.21 -.25 3.31 -11.92 -.25 2.69 -12.55 -.25 .39
  [4,15,-12.03,-.25,.42,-11.21,-.25,3.31,-11.92,-.25,2.69,-12.55,-.25,.39],
// 3 15 -15.14 -.25 1.02 -13.97 -.25 .47 -14.15 -.25 .76
  [3,15,-15.14,-.25,1.02,-13.97,-.25,.47,-14.15,-.25,.76],
// 4 15 -12.55 -.25 .39 -14.15 -.25 .76 -13.97 -.25 .47 -12.61 -.25 .21
  [4,15,-12.55,-.25,.39,-14.15,-.25,.76,-13.97,-.25,.47,-12.61,-.25,.21],
// 4 15 -12.03 -.25 .42 -12.55 -.25 .39 -12.61 -.25 .21 -11.12 -.25 .25
  [4,15,-12.03,-.25,.42,-12.55,-.25,.39,-12.61,-.25,.21,-11.12,-.25,.25],
// 3 15 -12.03 -.25 .42 -11.12 -.25 .25 -11.14 -.25 .49
  [3,15,-12.03,-.25,.42,-11.12,-.25,.25,-11.14,-.25,.49],
// 3 15 -9.66 -.25 .79 -11.12 -.25 .25 -9.54 -.25 .57
  [3,15,-9.66,-.25,.79,-11.12,-.25,.25,-9.54,-.25,.57],
// 4 15 -7.95 -.25 1.18 -8.03 -.25 1.39 -9.66 -.25 .79 -9.54 -.25 .57
  [4,15,-7.95,-.25,1.18,-8.03,-.25,1.39,-9.66,-.25,.79,-9.54,-.25,.57],
// 4 15 -6.8 -.25 2.09 -8.03 -.25 1.39 -7.95 -.25 1.18 -6.41 -.25 2.05
  [4,15,-6.8,-.25,2.09,-8.03,-.25,1.39,-7.95,-.25,1.18,-6.41,-.25,2.05],
// 4 15 -6.12 -.25 2.56 -6.8 -.25 2.09 -6.41 -.25 2.05 -4.97 -.25 3.15
  [4,15,-6.12,-.25,2.56,-6.8,-.25,2.09,-6.41,-.25,2.05,-4.97,-.25,3.15],
// 3 15 -6.12 -.25 2.56 -4.97 -.25 3.15 -5.13 -.25 3.34
  [3,15,-6.12,-.25,2.56,-4.97,-.25,3.15,-5.13,-.25,3.34],
// 4 15 -15.14 -.25 1.02 -14.97 -.25 1.13 -15.93 -.25 1.96 -16.08 -.25 1.83
  [4,15,-15.14,-.25,1.02,-14.97,-.25,1.13,-15.93,-.25,1.96,-16.08,-.25,1.83],
// 
// 3 84 -6.89 -.25 16.27 -38 -.25 18 -8.61 -.25 15.91
  [3,84,-6.89,-.25,16.27,-38,-.25,18,-8.61,-.25,15.91],
// 3 84 -8.61 -.25 15.91 -38 -.25 18 -10.37 -.25 15.32
  [3,84,-8.61,-.25,15.91,-38,-.25,18,-10.37,-.25,15.32],
// 3 84 -10.37 -.25 15.32 -38 -.25 18 -12.07 -.25 14.36
  [3,84,-10.37,-.25,15.32,-38,-.25,18,-12.07,-.25,14.36],
// 3 84 -12.07 -.25 14.36 -38 -.25 18 -13.67 -.25 13.15
  [3,84,-12.07,-.25,14.36,-38,-.25,18,-13.67,-.25,13.15],
// 3 84 -13.67 -.25 13.15 -38 -.25 18 -15.08 -.25 11.74
  [3,84,-13.67,-.25,13.15,-38,-.25,18,-15.08,-.25,11.74],
// 3 84 -15.08 -.25 11.74 -38 -.25 18 -16.27 -.25 10.19
  [3,84,-15.08,-.25,11.74,-38,-.25,18,-16.27,-.25,10.19],
// 3 84 -16.27 -.25 10.19 -38 -.25 18 -17.1 -.25 8.53
  [3,84,-16.27,-.25,10.19,-38,-.25,18,-17.1,-.25,8.53],
// 3 84 -17.1 -.25 8.53 -38 -.25 18 -17.7 -.25 6.88
  [3,84,-17.1,-.25,8.53,-38,-.25,18,-17.7,-.25,6.88],
// 3 84 -17.7 -.25 6.88 -38 -.25 18 -17.96 -.25 5.27
  [3,84,-17.7,-.25,6.88,-38,-.25,18,-17.96,-.25,5.27],
// 3 84 -17.96 -.25 5.27 -38 -.25 18 -17.89 -.25 3.75
  [3,84,-17.96,-.25,5.27,-38,-.25,18,-17.89,-.25,3.75],
// 4 84 -17.89 -.25 3.75 -38 -.25 18 -23.84 -.25 -1.96 -17.48 -.25 2.4
  [4,84,-17.89,-.25,3.75,-38,-.25,18,-23.84,-.25,-1.96,-17.48,-.25,2.4],
// 4 84 -17.48 -.25 2.4 -23.84 -.25 -1.96 -22.88 -.25 -2.44 -16.74 -.25 1.26
  [4,84,-17.48,-.25,2.4,-23.84,-.25,-1.96,-22.88,-.25,-2.44,-16.74,-.25,1.26],
// 4 84 -16.74 -.25 1.26 -22.88 -.25 -2.44 -21.76 -.25 -3.24 -15.71 -.25 .37
  [4,84,-16.74,-.25,1.26,-22.88,-.25,-2.44,-21.76,-.25,-3.24,-15.71,-.25,.37],
// 4 84 -15.71 -.25 .37 -21.76 -.25 -3.24 -20.96 -.25 -4.2 -14.43 -.25 -.23
  [4,84,-15.71,-.25,.37,-21.76,-.25,-3.24,-20.96,-.25,-4.2,-14.43,-.25,-.23],
// 3 84 -14.43 -.25 -.23 -20.96 -.25 -4.2 -12.94 -.25 -.51
  [3,84,-14.43,-.25,-.23,-20.96,-.25,-4.2,-12.94,-.25,-.51],
// 3 84 -12.94 -.25 -.51 -20.96 -.25 -4.2 -11.31 -.25 -.47
  [3,84,-12.94,-.25,-.51,-20.96,-.25,-4.2,-11.31,-.25,-.47],
// 3 84 -11.31 -.25 -.47 -20.96 -.25 -4.2 -9.59 -.25 -.11
  [3,84,-11.31,-.25,-.47,-20.96,-.25,-4.2,-9.59,-.25,-.11],
// 4 84 -9.59 -.25 -.11 -20.96 -.25 -4.2 9.77 -.25 5.49 -7.83 -.25 .48
  [4,84,-9.59,-.25,-.11,-20.96,-.25,-4.2,9.77,-.25,5.49,-7.83,-.25,.48],
// 3 84 -7.83 -.25 .48 9.77 -.25 5.49 -6.13 -.25 1.44
  [3,84,-7.83,-.25,.48,9.77,-.25,5.49,-6.13,-.25,1.44],
// 3 84 -6.13 -.25 1.44 9.77 -.25 5.49 -4.53 -.25 2.65
  [3,84,-6.13,-.25,1.44,9.77,-.25,5.49,-4.53,-.25,2.65],
// 3 84 -4.53 -.25 2.65 9.77 -.25 5.49 -3.12 -.25 4.06
  [3,84,-4.53,-.25,2.65,9.77,-.25,5.49,-3.12,-.25,4.06],
// 3 84 -3.12 -.25 4.06 9.77 -.25 5.49 -1.93 -.25 5.61
  [3,84,-3.12,-.25,4.06,9.77,-.25,5.49,-1.93,-.25,5.61],
// 3 84 -1.93 -.25 5.61 9.77 -.25 5.49 -1.1 -.25 7.27
  [3,84,-1.93,-.25,5.61,9.77,-.25,5.49,-1.1,-.25,7.27],
// 4 84 -1.1 -.25 7.27 9.77 -.25 5.49 10.56 -.25 12.52 -.5 -.25 8.92
  [4,84,-1.1,-.25,7.27,9.77,-.25,5.49,10.56,-.25,12.52,-.5,-.25,8.92],
// 4 84 -.5 -.25 8.92 10.56 -.25 12.52 10.72 -.25 12.92 -.24 -.25 10.53
  [4,84,-.5,-.25,8.92,10.56,-.25,12.52,10.72,-.25,12.92,-.24,-.25,10.53],
// 4 84 -.24 -.25 10.53 10.72 -.25 12.92 10.96 -.25 13.24 -.31 -.25 12.05
  [4,84,-.24,-.25,10.53,10.72,-.25,12.92,10.96,-.25,13.24,-.31,-.25,12.05],
// 3 84 -.31 -.25 12.05 10.96 -.25 13.24 -.72 -.25 13.4
  [3,84,-.31,-.25,12.05,10.96,-.25,13.24,-.72,-.25,13.4],
// 4 84 11.68 -.25 13.61 -1.46 -.25 14.54 -.72 -.25 13.4 10.96 -.25 13.24
  [4,84,11.68,-.25,13.61,-1.46,-.25,14.54,-.72,-.25,13.4,10.96,-.25,13.24],
// 4 84 11.68 -.25 13.61 38 -.25 18 -2.49 -.25 15.43 -1.46 -.25 14.54
  [4,84,11.68,-.25,13.61,38,-.25,18,-2.49,-.25,15.43,-1.46,-.25,14.54],
// 3 84 -2.49 -.25 15.43 38 -.25 18 -3.77 -.25 16.03
  [3,84,-2.49,-.25,15.43,38,-.25,18,-3.77,-.25,16.03],
// 3 84 -3.77 -.25 16.03 38 -.25 18 -5.26 -.25 16.31
  [3,84,-3.77,-.25,16.03,38,-.25,18,-5.26,-.25,16.31],
// 4 84 -38 -.25 18 -6.89 -.25 16.27 -5.26 -.25 16.31 38 -.25 18
  [4,84,-38,-.25,18,-6.89,-.25,16.27,-5.26,-.25,16.31,38,-.25,18],
];
module ldraw_lib__6372023a(step=0, col=false, unit=2/5, alt=false, line=0.2, solid=!$preview)
    makepoly(ldraw_lib__6372023a(), step=step, col=col, unit=unit, alt=alt, line=line, solid=solid);
ldraw_lib__6372023a(line=0.2);
